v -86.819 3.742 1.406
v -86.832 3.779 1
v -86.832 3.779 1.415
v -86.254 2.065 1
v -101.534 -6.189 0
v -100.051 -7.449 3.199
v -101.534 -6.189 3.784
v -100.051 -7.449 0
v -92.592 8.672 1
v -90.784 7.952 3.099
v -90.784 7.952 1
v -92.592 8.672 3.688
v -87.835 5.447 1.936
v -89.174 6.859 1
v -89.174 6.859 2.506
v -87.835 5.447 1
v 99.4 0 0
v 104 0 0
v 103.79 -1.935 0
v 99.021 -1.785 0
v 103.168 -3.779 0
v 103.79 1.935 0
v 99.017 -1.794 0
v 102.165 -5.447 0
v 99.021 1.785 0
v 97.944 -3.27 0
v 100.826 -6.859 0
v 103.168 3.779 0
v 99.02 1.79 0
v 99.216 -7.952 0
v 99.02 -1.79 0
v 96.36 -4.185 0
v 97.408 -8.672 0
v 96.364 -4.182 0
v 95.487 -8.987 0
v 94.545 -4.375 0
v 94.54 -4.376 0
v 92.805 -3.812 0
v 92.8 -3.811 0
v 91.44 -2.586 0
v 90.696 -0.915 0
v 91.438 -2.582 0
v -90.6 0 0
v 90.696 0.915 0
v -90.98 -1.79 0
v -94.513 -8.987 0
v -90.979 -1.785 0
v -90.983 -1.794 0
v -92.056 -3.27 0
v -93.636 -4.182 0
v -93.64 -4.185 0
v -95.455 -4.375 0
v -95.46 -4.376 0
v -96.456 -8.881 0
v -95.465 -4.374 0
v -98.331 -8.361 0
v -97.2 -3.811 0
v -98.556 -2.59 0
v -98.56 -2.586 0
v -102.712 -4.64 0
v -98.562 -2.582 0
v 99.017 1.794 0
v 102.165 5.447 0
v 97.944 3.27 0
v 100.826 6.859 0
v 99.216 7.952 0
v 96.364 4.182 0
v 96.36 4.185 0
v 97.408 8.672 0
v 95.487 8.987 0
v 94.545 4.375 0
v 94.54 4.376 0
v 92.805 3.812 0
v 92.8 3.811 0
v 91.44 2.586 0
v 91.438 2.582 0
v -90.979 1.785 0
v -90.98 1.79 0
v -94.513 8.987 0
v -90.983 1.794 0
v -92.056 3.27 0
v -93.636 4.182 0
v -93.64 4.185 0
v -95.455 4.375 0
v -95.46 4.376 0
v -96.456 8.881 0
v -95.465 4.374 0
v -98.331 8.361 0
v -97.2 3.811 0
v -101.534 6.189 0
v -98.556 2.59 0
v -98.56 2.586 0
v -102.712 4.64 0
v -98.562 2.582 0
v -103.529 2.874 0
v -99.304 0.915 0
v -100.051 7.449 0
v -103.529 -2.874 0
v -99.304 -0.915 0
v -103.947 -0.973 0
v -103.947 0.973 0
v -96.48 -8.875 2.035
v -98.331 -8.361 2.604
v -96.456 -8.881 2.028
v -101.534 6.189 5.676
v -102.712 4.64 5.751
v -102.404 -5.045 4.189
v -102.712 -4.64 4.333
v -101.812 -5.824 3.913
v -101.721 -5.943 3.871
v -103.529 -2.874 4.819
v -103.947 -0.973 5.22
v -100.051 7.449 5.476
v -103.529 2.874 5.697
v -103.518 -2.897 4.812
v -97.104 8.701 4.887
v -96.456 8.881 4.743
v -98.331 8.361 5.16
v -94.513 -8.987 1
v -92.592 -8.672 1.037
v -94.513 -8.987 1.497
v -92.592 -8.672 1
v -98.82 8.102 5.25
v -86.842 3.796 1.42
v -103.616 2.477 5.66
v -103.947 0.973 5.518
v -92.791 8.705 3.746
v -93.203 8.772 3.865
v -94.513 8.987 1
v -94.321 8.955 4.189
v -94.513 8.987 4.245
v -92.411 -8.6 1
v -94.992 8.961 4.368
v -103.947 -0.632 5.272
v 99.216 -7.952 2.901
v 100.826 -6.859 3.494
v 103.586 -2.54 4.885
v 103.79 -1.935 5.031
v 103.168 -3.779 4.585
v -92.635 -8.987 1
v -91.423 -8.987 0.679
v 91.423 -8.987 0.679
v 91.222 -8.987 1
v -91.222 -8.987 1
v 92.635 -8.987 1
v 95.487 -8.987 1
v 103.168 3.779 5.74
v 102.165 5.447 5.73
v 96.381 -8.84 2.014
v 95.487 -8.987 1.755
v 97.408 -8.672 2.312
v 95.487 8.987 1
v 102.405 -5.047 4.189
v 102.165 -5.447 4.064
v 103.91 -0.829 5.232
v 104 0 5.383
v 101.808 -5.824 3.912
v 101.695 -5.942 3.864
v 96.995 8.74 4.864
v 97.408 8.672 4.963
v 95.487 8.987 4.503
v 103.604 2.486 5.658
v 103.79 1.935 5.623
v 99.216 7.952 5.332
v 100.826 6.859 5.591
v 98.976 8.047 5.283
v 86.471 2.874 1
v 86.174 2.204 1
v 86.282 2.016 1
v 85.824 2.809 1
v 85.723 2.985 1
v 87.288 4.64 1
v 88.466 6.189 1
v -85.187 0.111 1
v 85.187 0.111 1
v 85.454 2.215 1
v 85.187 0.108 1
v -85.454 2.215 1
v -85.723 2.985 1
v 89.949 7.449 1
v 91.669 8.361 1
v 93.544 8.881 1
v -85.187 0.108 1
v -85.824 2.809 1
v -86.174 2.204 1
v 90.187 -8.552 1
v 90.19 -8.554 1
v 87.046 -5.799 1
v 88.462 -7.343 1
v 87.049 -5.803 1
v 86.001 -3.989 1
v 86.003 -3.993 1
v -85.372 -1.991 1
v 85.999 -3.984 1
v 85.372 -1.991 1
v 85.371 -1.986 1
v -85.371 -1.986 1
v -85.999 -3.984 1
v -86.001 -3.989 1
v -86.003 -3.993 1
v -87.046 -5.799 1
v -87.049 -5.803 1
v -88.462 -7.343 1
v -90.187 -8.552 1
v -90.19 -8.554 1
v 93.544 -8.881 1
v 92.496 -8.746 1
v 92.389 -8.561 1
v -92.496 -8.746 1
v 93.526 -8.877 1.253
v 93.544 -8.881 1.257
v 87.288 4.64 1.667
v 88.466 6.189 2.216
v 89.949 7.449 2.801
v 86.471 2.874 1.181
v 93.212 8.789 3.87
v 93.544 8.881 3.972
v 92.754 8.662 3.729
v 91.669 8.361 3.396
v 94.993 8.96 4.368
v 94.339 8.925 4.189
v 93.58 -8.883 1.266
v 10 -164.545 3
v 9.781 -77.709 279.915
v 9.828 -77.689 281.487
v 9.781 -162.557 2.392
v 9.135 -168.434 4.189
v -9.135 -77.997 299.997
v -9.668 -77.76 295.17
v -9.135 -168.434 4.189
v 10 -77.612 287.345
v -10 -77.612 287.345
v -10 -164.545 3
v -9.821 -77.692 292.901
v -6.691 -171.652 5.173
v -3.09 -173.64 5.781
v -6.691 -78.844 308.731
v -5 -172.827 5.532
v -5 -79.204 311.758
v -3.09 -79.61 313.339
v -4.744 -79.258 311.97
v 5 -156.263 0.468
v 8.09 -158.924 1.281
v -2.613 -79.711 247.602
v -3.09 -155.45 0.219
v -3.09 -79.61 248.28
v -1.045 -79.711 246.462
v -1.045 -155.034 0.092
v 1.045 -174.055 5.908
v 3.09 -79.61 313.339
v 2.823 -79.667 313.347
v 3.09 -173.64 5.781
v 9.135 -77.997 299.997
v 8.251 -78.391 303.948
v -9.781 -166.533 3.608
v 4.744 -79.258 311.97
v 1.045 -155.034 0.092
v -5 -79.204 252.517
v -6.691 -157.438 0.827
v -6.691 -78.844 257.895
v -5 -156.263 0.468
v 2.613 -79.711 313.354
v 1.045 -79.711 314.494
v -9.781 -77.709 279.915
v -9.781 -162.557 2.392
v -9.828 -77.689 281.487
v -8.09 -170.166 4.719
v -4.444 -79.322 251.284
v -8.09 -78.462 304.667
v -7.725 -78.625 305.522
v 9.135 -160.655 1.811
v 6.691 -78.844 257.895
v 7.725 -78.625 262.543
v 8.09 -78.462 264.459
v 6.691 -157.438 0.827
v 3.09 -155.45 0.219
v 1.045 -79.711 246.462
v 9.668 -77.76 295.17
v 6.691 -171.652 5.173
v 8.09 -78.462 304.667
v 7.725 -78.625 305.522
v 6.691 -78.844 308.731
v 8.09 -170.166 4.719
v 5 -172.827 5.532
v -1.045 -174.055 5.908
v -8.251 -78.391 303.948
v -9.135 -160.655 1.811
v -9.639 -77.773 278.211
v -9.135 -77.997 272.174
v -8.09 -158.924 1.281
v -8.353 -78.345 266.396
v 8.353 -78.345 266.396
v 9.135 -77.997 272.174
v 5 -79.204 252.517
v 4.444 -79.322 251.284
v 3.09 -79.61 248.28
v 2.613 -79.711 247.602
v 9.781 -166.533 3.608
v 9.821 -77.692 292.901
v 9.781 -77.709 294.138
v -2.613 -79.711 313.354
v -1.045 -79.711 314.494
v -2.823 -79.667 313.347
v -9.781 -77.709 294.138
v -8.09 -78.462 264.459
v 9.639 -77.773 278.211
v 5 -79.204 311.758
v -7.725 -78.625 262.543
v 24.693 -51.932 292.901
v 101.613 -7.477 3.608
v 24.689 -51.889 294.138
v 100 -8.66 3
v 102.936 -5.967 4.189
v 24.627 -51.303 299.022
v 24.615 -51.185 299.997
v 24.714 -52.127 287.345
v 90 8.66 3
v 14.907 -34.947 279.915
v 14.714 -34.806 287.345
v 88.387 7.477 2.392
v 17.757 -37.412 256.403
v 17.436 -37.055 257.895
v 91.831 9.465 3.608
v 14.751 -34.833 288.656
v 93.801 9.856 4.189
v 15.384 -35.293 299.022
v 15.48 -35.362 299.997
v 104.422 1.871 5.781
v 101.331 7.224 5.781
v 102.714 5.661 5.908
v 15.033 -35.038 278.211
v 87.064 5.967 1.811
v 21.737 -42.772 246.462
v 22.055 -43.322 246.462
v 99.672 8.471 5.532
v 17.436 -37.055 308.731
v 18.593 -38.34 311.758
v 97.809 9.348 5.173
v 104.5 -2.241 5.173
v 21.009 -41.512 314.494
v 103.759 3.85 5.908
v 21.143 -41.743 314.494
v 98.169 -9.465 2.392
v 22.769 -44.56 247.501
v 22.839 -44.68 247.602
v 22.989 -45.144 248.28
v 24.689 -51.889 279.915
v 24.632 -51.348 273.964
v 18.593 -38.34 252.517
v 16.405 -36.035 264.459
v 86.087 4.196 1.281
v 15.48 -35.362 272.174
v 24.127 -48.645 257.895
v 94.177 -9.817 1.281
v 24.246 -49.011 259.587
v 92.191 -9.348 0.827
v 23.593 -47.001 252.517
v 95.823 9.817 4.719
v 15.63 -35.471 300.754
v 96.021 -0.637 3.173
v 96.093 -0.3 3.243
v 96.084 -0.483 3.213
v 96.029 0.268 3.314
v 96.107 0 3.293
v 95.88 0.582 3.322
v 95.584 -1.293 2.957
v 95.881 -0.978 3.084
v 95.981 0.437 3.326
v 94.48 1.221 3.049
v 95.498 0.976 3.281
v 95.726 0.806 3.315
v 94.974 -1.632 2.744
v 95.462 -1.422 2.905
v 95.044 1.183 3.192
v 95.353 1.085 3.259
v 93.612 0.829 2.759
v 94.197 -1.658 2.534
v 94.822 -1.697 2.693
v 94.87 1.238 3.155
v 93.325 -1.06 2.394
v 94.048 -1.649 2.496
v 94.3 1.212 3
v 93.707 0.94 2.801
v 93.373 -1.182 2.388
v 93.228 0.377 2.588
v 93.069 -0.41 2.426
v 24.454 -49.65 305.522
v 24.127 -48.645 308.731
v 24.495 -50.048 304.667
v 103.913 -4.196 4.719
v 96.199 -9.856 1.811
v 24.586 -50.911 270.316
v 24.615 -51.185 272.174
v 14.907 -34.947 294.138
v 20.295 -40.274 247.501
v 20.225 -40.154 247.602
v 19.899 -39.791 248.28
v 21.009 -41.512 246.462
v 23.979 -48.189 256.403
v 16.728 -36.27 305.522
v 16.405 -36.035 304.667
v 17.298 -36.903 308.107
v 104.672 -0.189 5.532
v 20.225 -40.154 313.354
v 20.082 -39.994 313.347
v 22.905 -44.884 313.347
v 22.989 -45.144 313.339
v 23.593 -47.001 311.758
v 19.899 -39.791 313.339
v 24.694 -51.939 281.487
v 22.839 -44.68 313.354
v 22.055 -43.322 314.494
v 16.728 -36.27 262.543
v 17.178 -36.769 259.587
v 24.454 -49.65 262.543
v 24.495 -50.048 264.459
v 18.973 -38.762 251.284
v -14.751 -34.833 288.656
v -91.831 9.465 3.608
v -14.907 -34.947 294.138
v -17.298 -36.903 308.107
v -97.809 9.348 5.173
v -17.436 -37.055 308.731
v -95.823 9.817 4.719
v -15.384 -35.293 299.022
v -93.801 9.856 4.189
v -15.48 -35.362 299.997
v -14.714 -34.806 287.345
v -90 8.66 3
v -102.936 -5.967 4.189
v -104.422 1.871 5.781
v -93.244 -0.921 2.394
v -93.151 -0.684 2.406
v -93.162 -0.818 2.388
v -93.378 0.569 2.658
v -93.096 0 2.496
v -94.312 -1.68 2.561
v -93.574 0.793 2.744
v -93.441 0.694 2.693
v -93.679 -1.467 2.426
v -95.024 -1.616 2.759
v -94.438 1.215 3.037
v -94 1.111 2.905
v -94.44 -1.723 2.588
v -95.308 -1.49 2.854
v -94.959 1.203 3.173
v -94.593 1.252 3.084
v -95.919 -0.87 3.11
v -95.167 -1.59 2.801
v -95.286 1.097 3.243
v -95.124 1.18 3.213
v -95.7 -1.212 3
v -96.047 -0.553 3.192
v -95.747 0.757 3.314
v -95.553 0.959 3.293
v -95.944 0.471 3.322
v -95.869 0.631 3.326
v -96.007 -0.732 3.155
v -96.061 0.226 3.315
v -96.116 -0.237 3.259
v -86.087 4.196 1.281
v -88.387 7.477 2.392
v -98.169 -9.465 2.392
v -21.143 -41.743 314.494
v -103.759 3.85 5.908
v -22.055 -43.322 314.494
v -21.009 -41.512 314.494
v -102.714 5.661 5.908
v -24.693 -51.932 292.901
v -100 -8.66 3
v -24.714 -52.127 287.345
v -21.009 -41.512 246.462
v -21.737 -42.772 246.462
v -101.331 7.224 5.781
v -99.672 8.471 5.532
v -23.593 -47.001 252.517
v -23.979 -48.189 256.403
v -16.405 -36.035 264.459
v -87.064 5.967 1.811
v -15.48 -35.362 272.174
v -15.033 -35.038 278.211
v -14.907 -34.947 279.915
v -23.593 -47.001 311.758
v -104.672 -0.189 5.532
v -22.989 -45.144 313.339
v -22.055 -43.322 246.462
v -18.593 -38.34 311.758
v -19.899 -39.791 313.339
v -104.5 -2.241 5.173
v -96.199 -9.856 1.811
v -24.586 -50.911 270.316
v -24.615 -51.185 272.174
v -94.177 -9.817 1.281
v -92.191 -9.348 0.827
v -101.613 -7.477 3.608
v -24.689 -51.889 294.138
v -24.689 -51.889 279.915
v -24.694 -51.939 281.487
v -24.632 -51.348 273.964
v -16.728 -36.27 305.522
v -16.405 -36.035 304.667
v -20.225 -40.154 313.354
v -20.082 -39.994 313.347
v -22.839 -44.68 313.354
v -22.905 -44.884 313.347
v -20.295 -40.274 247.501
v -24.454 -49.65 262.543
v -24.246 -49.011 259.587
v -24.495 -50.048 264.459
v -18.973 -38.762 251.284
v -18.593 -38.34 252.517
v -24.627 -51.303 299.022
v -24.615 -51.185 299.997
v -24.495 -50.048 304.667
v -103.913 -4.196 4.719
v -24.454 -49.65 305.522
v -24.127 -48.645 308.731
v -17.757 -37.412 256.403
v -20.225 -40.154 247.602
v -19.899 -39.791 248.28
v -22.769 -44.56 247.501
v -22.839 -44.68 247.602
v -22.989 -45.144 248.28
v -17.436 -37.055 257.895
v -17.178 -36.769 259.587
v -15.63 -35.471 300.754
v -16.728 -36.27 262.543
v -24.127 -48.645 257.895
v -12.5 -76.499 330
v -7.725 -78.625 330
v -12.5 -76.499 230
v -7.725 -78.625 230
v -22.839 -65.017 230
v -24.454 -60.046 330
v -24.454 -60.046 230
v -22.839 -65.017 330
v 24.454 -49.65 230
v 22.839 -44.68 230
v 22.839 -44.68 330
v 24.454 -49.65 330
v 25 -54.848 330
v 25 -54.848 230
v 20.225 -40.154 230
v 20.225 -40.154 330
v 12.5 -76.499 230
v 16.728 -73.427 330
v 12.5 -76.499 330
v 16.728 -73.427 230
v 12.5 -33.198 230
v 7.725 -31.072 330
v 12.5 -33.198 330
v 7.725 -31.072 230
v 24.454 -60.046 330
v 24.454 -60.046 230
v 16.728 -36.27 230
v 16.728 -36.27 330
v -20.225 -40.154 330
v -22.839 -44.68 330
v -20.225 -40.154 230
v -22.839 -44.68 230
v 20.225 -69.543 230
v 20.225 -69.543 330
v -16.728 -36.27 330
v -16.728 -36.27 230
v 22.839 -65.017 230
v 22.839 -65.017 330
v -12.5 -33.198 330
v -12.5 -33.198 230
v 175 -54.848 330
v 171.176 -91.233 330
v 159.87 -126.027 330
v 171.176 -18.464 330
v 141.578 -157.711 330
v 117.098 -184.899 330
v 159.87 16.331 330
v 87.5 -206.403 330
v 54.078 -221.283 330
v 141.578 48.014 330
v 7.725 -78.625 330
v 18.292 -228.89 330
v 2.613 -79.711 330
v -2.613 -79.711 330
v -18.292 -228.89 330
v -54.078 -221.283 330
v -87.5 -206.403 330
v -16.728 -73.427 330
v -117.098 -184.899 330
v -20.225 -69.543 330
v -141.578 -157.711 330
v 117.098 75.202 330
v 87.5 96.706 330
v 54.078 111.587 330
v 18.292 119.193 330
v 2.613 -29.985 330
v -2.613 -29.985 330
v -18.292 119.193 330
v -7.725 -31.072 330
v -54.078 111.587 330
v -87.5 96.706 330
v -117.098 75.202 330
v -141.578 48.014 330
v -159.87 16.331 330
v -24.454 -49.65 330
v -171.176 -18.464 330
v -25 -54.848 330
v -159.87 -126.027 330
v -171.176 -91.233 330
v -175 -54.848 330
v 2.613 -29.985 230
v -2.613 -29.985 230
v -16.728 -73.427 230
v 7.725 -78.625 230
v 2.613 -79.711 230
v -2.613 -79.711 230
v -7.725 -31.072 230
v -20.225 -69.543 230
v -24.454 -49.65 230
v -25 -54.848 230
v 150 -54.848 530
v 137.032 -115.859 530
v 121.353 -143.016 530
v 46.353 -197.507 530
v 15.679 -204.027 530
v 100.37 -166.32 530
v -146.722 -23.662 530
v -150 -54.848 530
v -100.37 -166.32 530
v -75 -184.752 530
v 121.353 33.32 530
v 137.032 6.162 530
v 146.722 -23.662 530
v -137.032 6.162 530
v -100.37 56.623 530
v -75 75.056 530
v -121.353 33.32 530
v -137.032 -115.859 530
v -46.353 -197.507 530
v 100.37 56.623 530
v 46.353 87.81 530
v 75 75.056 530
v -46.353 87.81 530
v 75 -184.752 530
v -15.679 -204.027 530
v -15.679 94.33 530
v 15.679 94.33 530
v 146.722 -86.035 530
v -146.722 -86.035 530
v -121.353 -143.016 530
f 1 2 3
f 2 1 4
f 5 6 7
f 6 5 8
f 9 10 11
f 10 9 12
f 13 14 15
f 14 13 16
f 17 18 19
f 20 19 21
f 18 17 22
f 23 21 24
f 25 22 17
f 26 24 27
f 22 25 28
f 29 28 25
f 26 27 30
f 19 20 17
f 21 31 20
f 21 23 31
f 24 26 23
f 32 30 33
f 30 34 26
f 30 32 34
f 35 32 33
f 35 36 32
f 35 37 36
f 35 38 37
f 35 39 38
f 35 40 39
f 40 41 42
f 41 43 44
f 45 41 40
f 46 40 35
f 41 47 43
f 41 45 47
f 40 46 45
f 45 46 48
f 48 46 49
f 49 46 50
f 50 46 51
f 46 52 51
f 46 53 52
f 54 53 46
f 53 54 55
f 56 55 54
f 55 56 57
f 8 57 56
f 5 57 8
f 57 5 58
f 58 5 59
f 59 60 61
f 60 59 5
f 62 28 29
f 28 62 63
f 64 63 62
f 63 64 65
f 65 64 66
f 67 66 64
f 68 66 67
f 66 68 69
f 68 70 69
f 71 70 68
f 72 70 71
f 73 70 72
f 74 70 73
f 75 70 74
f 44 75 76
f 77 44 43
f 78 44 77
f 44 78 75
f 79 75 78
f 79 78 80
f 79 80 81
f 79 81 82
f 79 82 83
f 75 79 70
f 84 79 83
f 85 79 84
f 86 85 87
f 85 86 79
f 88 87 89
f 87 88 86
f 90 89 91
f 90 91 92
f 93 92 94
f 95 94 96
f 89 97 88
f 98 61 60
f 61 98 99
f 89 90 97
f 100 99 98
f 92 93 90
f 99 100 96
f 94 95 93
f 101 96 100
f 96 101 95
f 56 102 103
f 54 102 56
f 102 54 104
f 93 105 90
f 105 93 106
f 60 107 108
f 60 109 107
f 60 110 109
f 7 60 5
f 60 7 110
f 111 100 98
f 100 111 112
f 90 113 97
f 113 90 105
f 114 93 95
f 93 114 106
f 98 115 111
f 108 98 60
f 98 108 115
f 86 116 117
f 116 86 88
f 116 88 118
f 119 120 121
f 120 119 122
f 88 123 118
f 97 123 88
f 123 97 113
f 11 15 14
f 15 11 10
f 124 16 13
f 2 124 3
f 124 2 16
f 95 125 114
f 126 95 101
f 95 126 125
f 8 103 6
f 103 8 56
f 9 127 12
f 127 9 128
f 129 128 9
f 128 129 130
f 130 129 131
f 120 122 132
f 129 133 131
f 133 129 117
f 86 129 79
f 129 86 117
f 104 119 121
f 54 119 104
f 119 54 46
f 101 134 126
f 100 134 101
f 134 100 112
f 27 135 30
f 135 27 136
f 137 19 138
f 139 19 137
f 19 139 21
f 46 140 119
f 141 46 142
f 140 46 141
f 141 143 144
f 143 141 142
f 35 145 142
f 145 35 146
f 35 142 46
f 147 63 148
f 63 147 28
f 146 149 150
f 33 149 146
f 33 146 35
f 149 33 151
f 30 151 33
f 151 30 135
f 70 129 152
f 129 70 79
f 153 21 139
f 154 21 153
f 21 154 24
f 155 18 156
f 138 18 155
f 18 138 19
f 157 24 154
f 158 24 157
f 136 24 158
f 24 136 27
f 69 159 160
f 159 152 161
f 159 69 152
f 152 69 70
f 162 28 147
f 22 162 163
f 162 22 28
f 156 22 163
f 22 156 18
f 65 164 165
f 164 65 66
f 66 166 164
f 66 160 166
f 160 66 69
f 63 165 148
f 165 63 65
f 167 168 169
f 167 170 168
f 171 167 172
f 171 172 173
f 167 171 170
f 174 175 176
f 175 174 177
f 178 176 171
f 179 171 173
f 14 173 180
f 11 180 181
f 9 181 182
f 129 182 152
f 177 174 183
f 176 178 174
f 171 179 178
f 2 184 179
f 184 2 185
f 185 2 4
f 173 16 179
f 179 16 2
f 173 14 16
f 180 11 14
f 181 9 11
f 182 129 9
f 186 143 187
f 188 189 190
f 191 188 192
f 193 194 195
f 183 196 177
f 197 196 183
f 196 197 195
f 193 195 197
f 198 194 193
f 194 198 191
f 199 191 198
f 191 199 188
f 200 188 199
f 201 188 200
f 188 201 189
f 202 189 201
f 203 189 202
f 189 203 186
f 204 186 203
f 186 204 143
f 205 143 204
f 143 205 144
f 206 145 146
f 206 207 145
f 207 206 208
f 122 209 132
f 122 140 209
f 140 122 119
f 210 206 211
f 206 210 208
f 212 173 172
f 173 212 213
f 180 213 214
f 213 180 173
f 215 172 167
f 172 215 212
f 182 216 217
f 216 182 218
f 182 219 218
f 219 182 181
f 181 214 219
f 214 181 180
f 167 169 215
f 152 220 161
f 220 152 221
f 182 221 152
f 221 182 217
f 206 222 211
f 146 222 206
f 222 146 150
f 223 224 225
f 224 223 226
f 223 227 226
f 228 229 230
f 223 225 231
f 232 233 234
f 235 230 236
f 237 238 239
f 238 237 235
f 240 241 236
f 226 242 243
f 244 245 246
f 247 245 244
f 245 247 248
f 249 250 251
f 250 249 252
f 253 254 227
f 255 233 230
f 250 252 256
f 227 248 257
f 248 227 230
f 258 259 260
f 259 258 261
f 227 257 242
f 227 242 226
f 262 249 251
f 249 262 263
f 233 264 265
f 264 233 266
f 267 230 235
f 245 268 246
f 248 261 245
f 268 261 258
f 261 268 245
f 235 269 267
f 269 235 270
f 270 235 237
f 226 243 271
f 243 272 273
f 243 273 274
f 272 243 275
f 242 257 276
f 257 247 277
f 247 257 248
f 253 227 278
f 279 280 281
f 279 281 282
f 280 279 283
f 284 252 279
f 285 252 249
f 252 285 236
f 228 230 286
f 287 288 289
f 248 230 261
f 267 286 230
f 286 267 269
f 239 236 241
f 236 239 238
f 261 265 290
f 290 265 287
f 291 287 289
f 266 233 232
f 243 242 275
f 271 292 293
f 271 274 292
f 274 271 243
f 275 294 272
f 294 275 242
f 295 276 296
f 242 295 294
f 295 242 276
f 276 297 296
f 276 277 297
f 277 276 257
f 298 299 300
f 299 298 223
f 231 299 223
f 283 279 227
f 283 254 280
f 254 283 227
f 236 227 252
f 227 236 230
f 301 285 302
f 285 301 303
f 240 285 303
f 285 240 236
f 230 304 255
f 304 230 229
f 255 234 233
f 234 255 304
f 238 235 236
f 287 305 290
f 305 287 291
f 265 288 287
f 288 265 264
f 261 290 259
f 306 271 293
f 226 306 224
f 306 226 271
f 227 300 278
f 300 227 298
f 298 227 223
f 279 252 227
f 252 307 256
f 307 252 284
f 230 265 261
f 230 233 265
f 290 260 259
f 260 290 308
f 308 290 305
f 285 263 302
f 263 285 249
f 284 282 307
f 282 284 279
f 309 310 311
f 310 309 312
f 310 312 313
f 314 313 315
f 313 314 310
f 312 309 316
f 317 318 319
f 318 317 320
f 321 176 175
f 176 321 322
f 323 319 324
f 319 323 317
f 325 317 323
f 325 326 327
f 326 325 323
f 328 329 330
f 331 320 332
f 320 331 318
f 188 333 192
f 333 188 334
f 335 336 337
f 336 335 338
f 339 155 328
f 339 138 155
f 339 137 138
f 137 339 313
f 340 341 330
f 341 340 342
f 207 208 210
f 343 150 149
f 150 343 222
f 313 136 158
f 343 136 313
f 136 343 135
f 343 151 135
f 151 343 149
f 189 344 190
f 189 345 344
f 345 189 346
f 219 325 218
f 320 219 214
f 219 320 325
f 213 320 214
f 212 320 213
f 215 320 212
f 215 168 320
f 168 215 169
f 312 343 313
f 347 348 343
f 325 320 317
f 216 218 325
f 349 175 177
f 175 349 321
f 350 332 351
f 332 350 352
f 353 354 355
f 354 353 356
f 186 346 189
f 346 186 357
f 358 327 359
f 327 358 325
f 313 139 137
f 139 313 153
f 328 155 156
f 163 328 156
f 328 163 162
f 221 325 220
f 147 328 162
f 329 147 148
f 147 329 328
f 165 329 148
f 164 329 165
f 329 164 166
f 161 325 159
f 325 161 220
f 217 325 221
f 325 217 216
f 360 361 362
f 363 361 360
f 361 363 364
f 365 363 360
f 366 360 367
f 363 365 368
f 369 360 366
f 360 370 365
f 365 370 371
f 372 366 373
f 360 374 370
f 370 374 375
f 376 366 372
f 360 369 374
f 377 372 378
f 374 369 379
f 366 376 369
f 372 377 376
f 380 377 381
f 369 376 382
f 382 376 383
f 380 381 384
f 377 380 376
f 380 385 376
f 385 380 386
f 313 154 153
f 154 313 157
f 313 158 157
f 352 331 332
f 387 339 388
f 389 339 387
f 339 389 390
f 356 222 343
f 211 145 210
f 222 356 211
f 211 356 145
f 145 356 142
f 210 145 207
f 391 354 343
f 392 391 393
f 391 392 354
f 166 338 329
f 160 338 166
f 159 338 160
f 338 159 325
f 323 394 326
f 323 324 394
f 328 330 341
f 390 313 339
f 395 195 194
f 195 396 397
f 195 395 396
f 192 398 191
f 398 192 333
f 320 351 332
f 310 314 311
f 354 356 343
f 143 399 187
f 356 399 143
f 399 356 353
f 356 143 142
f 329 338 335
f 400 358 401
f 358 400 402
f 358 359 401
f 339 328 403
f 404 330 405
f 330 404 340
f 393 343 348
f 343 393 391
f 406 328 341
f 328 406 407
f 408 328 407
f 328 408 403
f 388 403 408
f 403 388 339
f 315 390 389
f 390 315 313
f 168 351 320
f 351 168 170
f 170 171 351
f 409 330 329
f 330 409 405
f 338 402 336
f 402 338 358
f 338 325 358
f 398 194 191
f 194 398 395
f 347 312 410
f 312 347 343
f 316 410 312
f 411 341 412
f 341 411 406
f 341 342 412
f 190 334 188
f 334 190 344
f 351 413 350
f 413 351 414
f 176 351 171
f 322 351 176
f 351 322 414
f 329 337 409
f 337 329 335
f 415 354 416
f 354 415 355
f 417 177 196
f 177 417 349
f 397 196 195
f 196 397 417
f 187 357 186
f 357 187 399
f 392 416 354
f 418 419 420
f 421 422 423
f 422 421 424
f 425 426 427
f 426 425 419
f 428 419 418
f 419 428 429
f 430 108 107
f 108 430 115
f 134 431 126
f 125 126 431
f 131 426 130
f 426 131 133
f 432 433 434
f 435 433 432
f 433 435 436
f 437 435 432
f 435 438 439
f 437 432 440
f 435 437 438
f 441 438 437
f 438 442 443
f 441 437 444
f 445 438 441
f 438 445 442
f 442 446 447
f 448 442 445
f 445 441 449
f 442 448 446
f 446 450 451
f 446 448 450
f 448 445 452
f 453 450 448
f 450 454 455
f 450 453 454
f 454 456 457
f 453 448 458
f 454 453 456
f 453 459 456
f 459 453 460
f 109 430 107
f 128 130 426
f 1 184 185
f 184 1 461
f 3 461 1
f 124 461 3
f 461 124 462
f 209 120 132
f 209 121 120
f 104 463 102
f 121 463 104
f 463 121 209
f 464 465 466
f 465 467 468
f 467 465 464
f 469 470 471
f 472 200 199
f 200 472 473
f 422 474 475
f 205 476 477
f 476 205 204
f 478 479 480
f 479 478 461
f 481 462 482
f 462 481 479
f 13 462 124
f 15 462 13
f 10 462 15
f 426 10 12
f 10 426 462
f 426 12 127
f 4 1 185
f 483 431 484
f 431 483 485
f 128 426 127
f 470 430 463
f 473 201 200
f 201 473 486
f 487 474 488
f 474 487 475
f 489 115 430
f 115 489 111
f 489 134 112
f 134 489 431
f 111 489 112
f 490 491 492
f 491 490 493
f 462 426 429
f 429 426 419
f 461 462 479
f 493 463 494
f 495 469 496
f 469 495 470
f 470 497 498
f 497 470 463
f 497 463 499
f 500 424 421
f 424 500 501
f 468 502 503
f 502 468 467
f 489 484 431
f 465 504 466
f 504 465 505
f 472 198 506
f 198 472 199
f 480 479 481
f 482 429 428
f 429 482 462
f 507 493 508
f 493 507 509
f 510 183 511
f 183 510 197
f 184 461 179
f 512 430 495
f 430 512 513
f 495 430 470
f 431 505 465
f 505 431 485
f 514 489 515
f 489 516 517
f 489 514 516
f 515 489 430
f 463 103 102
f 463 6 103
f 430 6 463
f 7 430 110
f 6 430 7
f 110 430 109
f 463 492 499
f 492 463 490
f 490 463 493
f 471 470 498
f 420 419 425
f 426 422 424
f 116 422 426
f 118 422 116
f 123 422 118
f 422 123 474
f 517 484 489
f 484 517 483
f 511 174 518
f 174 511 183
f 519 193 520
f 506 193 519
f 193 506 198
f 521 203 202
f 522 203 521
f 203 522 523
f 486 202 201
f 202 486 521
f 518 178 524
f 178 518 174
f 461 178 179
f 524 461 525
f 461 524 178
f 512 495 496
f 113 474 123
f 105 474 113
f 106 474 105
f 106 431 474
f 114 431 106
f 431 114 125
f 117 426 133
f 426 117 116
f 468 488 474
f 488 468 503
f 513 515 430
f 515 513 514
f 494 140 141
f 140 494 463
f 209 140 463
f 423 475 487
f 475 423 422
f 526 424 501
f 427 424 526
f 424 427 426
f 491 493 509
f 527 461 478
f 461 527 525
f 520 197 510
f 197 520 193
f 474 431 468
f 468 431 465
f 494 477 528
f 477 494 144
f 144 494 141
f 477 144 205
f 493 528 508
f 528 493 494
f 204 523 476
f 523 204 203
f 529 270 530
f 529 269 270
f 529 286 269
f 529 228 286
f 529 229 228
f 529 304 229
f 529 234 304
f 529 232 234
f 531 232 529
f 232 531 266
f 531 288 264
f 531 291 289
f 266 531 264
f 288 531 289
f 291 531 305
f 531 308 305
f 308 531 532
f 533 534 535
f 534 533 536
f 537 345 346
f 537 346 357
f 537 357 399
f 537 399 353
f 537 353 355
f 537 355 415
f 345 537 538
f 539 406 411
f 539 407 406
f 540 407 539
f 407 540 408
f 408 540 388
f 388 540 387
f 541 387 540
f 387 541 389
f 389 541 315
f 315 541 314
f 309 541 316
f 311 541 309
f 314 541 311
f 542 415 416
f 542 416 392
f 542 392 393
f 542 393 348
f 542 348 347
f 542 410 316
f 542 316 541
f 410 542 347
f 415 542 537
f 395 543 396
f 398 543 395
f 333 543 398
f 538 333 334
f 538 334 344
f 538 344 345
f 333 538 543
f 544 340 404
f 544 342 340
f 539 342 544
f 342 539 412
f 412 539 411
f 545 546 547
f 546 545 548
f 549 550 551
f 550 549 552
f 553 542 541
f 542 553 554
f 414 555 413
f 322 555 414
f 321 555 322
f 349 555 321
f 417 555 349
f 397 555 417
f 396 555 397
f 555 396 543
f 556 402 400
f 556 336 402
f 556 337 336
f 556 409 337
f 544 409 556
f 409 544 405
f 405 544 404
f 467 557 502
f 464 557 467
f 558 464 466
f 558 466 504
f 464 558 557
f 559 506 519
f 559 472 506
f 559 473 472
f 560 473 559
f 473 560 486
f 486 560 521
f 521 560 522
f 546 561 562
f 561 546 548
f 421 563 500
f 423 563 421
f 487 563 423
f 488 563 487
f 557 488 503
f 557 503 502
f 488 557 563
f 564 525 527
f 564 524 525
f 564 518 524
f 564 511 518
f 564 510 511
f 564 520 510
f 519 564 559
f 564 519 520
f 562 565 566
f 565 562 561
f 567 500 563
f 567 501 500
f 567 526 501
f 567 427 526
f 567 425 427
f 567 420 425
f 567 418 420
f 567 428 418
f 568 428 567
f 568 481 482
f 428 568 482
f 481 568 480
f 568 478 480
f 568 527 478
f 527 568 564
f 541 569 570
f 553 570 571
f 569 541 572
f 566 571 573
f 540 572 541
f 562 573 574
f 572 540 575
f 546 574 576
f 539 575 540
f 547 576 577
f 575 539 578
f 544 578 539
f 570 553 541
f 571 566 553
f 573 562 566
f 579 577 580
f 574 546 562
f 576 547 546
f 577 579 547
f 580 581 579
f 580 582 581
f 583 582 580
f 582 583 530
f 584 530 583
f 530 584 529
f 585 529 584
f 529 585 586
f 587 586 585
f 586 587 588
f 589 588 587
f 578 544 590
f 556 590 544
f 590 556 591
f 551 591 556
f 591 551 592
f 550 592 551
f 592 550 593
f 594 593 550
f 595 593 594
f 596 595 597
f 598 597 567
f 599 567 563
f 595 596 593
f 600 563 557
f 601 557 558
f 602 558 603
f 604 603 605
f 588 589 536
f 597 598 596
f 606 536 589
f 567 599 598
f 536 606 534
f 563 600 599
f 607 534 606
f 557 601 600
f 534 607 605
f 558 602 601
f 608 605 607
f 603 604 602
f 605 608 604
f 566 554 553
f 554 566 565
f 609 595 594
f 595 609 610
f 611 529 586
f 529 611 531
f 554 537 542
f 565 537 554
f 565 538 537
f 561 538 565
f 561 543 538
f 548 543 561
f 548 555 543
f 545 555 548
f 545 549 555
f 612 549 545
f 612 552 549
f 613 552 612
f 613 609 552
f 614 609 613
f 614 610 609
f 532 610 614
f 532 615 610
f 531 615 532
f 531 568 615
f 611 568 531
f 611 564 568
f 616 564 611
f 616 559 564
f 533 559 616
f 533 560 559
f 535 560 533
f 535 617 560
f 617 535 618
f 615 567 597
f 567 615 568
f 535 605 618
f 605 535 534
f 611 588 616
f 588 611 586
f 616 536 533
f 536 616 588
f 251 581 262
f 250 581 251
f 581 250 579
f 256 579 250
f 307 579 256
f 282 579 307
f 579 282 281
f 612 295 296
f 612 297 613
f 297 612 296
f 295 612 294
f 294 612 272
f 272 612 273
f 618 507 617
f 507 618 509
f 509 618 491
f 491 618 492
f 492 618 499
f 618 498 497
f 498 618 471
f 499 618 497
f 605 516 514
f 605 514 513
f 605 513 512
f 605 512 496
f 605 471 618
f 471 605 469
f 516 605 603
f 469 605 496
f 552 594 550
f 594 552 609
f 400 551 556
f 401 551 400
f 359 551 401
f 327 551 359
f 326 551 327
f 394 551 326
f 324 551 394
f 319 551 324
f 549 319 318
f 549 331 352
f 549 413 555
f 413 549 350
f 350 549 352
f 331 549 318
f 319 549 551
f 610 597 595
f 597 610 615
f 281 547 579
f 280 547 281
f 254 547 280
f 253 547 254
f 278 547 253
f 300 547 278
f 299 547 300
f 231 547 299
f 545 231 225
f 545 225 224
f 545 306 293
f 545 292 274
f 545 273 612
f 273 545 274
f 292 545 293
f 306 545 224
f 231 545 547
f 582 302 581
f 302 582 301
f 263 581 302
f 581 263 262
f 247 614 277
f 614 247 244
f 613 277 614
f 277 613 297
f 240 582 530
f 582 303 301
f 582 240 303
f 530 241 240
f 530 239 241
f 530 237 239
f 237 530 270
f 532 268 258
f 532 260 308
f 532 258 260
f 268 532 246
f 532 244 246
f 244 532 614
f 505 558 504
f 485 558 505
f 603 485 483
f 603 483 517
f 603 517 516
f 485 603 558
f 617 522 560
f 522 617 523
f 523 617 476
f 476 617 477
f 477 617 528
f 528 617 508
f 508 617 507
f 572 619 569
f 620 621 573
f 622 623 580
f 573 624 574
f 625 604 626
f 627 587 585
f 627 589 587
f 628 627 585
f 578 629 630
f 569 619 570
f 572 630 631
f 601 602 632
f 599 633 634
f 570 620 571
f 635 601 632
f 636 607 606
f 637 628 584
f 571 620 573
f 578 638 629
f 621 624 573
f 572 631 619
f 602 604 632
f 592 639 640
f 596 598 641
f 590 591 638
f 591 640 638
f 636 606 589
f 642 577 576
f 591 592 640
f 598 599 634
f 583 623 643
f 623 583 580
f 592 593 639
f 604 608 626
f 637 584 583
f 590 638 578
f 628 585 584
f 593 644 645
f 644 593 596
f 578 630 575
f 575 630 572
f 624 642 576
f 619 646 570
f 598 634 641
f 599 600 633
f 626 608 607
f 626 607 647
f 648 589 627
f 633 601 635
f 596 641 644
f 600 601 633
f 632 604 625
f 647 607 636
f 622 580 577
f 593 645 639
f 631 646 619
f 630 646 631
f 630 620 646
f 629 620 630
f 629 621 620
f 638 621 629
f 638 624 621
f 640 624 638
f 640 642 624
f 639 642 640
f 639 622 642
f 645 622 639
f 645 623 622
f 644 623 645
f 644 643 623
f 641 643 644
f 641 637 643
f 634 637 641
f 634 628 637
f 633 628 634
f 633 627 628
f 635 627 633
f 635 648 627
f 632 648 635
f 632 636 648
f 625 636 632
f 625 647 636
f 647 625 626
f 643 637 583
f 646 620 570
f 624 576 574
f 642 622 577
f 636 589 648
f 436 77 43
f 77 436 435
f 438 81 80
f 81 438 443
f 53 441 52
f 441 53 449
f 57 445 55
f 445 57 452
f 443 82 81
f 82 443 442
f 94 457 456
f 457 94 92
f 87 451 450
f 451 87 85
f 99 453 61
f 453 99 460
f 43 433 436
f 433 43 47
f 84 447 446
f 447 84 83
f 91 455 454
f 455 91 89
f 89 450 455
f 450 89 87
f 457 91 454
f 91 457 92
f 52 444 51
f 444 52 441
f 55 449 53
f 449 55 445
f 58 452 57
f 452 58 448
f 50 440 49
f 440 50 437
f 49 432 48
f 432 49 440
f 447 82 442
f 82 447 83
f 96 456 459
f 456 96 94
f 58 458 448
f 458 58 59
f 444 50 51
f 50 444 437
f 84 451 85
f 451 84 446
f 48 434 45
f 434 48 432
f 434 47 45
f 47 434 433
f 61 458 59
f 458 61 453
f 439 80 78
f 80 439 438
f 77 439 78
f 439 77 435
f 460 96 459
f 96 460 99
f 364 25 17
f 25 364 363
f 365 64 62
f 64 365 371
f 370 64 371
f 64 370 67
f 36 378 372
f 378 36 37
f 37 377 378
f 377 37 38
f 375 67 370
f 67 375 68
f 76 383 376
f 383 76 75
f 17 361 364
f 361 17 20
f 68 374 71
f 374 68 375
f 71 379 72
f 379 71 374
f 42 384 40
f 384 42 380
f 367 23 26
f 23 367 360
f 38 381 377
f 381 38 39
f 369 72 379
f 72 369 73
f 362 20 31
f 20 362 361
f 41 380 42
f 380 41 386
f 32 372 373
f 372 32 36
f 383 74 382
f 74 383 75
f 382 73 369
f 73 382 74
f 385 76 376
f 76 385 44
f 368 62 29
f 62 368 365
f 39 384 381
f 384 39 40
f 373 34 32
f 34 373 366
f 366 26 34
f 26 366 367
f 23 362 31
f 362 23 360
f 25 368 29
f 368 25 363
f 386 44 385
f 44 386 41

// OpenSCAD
module lamp() {
    translate([0,-190/sqrt(3),3]) {
        th = 17;
        rotate([-th,0,0])
            cylinder(d=20, h=370);
        rotate([0,0,-30])
            translate([0,190,0])
                rotate([0,0,-30])
                rotate([th,0,0])
                cylinder(d=20, h=370);
        rotate([0,0,30])
            translate([0,190,0])
                rotate([0,0,30])
                rotate([th,0,0])
                cylinder(d=20, h=370);
    }
    translate([0,0,230])
        cylinder(d=50, h=100);
    translate([0,0,330])
        color("gray")
            cylinder(d1=350, d2 = 300, h=200);
}

color("lightblue")
{
    difference() {
        union() {
            translate([-190/2,0])
                cylinder(d=18,h=7);
            hull() {
                translate([-190/2,0])
                    cylinder(d=18,h=1);
                translate([190/2,0])
                    cylinder(d=18,h=1);
            }
            translate([190/2,0])
                cylinder(d=18,h=7);
        }
        
                translate([-190/2,0,-0.1])
                    cylinder(d1=9, d2=1,h=4);
                translate([190/2,0,-0.1])
                    cylinder(d1=9, d2=1,h=4);

        translate([0,-190/2/sqrt(3)])
            lamp();
    }
}

        translate([0,-190/2/sqrt(3)])
            lamp();
